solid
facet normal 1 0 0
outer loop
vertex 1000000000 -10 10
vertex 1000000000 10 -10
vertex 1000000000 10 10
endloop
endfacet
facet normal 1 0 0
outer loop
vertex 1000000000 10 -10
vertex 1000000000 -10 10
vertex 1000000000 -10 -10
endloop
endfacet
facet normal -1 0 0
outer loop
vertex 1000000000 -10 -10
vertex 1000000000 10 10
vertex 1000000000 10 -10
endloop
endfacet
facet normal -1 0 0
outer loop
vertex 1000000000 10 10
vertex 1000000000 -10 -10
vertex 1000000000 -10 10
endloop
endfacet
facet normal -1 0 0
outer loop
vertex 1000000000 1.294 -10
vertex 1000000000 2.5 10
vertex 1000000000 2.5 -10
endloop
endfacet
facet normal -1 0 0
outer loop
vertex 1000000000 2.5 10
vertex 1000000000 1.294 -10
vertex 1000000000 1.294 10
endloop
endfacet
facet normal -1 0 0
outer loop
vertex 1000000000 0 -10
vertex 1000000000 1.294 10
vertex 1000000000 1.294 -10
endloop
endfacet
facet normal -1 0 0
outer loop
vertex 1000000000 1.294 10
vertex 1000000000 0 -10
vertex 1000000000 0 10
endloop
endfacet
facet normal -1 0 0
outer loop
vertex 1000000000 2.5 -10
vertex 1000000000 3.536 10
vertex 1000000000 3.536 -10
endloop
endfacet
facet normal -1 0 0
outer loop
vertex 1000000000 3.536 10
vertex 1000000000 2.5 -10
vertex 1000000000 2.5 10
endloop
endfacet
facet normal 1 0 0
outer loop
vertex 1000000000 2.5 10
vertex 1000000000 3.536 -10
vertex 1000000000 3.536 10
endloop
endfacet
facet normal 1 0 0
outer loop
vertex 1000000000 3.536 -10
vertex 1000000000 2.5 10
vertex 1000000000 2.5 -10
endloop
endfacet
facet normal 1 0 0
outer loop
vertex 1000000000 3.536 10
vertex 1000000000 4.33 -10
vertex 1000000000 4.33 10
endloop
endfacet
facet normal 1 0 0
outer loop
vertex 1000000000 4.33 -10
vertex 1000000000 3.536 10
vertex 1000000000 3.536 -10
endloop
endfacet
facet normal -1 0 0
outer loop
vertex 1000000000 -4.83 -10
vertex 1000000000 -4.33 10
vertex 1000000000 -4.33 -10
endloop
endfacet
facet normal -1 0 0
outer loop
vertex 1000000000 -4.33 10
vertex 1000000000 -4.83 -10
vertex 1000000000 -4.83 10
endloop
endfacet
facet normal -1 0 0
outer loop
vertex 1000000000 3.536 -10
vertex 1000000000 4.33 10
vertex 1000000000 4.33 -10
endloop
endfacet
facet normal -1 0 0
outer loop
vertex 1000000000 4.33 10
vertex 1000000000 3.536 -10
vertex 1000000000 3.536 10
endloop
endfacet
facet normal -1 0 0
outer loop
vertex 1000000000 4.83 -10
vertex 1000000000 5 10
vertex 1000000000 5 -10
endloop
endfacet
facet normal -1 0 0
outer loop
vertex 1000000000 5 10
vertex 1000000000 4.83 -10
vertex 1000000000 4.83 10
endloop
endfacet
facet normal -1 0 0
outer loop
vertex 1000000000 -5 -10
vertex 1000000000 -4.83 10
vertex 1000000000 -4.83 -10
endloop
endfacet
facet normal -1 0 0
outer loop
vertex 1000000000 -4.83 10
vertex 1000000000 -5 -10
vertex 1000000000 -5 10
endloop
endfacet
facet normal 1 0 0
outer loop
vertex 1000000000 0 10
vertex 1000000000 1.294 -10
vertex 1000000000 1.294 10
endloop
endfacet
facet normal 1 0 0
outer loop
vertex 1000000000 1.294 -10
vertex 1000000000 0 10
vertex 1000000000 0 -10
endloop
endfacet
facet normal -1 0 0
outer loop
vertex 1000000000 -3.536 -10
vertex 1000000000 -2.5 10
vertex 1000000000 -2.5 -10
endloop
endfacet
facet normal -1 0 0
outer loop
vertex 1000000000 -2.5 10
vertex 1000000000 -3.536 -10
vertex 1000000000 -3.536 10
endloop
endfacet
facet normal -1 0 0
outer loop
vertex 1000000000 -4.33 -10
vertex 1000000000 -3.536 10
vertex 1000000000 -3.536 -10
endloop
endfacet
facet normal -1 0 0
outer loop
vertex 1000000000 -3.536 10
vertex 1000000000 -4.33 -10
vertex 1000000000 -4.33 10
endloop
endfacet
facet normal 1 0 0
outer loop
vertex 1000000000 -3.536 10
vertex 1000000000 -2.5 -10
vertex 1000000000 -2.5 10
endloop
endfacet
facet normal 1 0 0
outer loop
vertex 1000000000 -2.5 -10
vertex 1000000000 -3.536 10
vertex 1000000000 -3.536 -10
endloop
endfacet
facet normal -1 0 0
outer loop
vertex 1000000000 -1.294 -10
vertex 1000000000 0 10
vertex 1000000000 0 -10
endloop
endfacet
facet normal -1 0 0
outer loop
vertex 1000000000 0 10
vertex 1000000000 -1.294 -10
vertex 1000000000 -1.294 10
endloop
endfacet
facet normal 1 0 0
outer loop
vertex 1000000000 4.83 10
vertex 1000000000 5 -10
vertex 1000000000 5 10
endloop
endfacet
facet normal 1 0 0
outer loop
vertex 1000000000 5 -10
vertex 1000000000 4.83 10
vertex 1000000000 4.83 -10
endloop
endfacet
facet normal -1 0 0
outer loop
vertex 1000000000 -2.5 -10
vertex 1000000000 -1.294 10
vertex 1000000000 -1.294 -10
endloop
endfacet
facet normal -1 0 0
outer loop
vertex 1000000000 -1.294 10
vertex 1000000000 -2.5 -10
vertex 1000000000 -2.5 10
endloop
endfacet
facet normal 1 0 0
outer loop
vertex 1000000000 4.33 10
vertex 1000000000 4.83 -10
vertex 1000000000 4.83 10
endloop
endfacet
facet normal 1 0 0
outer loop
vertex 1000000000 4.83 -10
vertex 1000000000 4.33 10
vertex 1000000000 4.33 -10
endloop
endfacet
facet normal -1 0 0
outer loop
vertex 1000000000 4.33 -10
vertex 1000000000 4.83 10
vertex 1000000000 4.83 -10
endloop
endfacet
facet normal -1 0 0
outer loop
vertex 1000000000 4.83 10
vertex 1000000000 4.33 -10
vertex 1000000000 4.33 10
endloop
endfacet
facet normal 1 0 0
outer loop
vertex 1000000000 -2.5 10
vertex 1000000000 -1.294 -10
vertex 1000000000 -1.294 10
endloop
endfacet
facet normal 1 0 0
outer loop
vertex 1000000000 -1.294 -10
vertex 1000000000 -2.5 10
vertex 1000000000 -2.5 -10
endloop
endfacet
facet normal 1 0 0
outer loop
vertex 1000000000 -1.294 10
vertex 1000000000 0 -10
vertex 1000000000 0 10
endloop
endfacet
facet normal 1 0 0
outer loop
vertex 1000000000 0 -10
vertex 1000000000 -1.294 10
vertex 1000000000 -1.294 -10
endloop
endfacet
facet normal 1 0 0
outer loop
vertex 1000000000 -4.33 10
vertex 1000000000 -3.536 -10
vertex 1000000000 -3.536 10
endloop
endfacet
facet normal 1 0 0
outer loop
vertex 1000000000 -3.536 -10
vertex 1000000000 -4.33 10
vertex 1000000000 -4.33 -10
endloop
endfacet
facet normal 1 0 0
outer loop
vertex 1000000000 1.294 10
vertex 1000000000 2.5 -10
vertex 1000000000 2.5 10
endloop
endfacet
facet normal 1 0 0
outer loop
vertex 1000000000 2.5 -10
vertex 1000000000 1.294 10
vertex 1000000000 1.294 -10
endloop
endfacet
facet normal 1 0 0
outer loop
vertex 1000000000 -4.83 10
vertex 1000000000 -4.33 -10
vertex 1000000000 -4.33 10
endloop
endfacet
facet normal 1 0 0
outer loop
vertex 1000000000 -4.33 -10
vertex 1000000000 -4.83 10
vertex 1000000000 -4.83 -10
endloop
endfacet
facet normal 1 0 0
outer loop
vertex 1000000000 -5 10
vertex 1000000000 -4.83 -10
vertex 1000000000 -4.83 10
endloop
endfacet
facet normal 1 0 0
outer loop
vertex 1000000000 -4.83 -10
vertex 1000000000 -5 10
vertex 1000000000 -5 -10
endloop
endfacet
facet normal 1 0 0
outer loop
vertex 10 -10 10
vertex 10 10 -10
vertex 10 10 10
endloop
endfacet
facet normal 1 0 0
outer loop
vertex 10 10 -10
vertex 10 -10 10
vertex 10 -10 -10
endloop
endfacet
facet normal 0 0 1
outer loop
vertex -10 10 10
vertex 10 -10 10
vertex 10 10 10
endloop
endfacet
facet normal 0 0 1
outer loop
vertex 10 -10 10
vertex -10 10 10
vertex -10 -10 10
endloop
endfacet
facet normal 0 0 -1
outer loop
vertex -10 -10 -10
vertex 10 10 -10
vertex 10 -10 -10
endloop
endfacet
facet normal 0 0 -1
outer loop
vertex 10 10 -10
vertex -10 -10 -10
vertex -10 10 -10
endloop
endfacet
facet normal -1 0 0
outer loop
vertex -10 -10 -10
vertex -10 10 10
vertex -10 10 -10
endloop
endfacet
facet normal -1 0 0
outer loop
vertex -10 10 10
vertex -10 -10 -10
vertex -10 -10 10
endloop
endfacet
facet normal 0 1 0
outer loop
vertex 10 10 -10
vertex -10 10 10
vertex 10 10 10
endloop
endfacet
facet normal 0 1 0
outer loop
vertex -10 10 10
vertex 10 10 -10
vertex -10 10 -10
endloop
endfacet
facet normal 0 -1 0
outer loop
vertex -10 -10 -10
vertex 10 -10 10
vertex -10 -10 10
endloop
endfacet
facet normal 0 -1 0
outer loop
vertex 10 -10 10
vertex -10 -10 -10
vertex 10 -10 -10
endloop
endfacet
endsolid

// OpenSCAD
cube(20,center=true);translate([1000000013.25,0,0])difference(){cube(20,center=true);cylinder(h=30,r=5,center=true,$fn=24);}
